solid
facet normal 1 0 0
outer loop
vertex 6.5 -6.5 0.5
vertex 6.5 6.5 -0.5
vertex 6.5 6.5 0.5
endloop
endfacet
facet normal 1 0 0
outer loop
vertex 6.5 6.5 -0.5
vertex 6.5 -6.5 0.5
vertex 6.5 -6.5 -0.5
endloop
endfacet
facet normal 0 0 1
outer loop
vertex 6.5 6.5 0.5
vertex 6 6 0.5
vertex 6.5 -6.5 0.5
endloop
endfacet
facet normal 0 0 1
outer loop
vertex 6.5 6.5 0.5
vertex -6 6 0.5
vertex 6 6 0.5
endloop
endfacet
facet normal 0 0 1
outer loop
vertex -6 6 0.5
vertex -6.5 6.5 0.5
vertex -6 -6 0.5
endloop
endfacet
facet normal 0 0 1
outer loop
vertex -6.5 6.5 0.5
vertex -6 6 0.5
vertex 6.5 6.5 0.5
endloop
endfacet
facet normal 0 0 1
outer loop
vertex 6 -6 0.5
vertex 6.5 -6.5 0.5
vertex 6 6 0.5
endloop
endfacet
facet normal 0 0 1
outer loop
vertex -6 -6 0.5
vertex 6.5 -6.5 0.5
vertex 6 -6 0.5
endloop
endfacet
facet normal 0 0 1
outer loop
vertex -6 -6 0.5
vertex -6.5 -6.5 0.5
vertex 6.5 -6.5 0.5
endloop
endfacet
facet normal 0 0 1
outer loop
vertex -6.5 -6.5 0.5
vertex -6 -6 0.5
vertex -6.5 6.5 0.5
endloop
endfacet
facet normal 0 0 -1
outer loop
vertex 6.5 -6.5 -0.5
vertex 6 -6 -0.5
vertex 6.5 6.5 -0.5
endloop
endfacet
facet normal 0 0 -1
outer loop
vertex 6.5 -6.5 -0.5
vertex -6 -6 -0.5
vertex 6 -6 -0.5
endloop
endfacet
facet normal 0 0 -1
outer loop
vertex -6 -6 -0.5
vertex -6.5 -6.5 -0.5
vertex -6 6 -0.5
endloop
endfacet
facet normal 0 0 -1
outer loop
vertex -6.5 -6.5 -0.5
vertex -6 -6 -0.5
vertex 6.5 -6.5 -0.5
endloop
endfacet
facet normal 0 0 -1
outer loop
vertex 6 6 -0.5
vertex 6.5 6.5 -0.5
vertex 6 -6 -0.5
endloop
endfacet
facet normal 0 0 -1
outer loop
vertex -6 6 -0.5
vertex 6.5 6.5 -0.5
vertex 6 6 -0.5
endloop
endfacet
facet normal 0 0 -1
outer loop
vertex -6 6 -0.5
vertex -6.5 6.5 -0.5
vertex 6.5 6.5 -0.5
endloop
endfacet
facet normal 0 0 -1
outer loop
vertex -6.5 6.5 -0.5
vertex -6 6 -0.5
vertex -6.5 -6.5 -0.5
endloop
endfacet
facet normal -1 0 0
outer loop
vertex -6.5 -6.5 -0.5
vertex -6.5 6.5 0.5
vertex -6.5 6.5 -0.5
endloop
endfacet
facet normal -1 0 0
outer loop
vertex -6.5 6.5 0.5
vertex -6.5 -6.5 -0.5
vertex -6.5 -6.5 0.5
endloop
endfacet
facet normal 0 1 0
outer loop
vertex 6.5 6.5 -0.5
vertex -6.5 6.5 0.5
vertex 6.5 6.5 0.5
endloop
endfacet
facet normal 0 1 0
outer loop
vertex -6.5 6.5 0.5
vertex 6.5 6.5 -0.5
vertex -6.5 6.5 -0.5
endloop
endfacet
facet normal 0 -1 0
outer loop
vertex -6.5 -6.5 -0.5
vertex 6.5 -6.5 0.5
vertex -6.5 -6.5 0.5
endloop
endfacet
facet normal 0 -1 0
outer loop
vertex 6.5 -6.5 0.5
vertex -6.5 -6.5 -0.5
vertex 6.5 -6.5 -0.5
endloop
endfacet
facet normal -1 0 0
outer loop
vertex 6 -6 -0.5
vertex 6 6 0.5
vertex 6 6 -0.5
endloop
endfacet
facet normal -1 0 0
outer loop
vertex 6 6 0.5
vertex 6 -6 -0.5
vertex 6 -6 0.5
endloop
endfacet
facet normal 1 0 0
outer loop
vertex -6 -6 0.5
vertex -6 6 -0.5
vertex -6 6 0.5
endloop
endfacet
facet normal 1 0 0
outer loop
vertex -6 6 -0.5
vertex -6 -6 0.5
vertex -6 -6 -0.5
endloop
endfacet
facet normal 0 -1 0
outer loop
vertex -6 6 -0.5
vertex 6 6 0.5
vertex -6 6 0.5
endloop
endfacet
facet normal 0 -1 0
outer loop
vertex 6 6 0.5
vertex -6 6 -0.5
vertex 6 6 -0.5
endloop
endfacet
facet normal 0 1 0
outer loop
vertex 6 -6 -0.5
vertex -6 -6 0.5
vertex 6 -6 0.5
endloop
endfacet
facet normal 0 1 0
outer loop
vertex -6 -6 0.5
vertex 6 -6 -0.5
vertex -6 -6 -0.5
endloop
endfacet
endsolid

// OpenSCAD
devide = 12;
joist = 1;


// const
bread = 12;
base = bread + joist;


// create
difference(){
    cube([base, base, bread/devide], center=true);
    cube(bread, true);
}
